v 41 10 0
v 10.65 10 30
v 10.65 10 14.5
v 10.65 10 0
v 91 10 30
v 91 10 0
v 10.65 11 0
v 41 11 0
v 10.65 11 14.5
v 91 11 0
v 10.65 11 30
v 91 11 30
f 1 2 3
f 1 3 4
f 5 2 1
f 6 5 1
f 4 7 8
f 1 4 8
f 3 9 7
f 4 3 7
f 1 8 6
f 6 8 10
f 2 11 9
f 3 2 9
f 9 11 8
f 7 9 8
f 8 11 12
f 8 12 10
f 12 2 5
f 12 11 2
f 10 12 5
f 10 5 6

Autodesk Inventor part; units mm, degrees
ref_plane "YZ Plane" through (0, 0, 0) normal (1, 0, 0) x (0, 1, 0)
ref_plane "XZ Plane" through (0, 0, 0) normal (0, 1, 0) x (-1, 0, 0)
ref_plane "XY Plane" through (0, 0, 0) normal (0, 0, 1) x (1, 0, 0)
ref_plane "Work Plane1" through (66, 11, 8.5) normal (0, -1, 0) x (0.1498, 0, -0.9887)
ref_plane "Work Plane2" through (65.6255, 11, 10.9718) normal (0, -1, 0) x (0.1498, 0, -0.9887)
sketch "Sketch2" plane through (65.6255, 11, 10.9718) normal (0, -1, 0) x (0.1498, 0, -0.9887)
  line L0 (-9.1533, -157.0261) -> (10.6197, -26.5155) projected
  line L1 (10.6197, -26.5155) -> (7.1592, -25.9912) projected
  line L2 (-12.6138, -156.5018) -> (7.1592, -25.9912) projected
  line L3 (-9.1533, -157.0261) -> (-12.6138, -156.5018) projected
  line L4 (10.6197, -26.5155) -> (18.1095, 22.9204) projected
  line L5 (18.1095, 22.9204) -> (14.649, 23.4447) projected
  line L6 (7.1592, -25.9912) -> (14.649, 23.4447) projected
  line L7 (10.6197, -26.5155) -> (7.1592, -25.9912) projected
  circle A0 centre (2.9555, -29.9965) radius 2 projected
  line L8 (-27.0486, -51.5049) -> (-11.7235, -53.8267) projected
  line L9 (-27.0486, -51.5049) -> (-15.0125, 27.9385) projected
  line L10 (-27.0486, -51.5049) -> (-15.0125, 27.9385)
  line L11 (-15.0125, 27.9385) -> (14.649, 23.4447)
  line L12 (14.649, 23.4447) -> (2.6129, -55.9987)
  line L13 (-27.0486, -51.5049) -> (2.6129, -55.9987)
  point P0 (1.0176, -66.5286)
  point P1 (-11.7235, -53.8267)
extrude "Extrusion1" add sketch "Sketch2" along normal blind 1 contours L2 L13 L8 L9 L11 L6 | A0
properties part number "right_gear_holder"
